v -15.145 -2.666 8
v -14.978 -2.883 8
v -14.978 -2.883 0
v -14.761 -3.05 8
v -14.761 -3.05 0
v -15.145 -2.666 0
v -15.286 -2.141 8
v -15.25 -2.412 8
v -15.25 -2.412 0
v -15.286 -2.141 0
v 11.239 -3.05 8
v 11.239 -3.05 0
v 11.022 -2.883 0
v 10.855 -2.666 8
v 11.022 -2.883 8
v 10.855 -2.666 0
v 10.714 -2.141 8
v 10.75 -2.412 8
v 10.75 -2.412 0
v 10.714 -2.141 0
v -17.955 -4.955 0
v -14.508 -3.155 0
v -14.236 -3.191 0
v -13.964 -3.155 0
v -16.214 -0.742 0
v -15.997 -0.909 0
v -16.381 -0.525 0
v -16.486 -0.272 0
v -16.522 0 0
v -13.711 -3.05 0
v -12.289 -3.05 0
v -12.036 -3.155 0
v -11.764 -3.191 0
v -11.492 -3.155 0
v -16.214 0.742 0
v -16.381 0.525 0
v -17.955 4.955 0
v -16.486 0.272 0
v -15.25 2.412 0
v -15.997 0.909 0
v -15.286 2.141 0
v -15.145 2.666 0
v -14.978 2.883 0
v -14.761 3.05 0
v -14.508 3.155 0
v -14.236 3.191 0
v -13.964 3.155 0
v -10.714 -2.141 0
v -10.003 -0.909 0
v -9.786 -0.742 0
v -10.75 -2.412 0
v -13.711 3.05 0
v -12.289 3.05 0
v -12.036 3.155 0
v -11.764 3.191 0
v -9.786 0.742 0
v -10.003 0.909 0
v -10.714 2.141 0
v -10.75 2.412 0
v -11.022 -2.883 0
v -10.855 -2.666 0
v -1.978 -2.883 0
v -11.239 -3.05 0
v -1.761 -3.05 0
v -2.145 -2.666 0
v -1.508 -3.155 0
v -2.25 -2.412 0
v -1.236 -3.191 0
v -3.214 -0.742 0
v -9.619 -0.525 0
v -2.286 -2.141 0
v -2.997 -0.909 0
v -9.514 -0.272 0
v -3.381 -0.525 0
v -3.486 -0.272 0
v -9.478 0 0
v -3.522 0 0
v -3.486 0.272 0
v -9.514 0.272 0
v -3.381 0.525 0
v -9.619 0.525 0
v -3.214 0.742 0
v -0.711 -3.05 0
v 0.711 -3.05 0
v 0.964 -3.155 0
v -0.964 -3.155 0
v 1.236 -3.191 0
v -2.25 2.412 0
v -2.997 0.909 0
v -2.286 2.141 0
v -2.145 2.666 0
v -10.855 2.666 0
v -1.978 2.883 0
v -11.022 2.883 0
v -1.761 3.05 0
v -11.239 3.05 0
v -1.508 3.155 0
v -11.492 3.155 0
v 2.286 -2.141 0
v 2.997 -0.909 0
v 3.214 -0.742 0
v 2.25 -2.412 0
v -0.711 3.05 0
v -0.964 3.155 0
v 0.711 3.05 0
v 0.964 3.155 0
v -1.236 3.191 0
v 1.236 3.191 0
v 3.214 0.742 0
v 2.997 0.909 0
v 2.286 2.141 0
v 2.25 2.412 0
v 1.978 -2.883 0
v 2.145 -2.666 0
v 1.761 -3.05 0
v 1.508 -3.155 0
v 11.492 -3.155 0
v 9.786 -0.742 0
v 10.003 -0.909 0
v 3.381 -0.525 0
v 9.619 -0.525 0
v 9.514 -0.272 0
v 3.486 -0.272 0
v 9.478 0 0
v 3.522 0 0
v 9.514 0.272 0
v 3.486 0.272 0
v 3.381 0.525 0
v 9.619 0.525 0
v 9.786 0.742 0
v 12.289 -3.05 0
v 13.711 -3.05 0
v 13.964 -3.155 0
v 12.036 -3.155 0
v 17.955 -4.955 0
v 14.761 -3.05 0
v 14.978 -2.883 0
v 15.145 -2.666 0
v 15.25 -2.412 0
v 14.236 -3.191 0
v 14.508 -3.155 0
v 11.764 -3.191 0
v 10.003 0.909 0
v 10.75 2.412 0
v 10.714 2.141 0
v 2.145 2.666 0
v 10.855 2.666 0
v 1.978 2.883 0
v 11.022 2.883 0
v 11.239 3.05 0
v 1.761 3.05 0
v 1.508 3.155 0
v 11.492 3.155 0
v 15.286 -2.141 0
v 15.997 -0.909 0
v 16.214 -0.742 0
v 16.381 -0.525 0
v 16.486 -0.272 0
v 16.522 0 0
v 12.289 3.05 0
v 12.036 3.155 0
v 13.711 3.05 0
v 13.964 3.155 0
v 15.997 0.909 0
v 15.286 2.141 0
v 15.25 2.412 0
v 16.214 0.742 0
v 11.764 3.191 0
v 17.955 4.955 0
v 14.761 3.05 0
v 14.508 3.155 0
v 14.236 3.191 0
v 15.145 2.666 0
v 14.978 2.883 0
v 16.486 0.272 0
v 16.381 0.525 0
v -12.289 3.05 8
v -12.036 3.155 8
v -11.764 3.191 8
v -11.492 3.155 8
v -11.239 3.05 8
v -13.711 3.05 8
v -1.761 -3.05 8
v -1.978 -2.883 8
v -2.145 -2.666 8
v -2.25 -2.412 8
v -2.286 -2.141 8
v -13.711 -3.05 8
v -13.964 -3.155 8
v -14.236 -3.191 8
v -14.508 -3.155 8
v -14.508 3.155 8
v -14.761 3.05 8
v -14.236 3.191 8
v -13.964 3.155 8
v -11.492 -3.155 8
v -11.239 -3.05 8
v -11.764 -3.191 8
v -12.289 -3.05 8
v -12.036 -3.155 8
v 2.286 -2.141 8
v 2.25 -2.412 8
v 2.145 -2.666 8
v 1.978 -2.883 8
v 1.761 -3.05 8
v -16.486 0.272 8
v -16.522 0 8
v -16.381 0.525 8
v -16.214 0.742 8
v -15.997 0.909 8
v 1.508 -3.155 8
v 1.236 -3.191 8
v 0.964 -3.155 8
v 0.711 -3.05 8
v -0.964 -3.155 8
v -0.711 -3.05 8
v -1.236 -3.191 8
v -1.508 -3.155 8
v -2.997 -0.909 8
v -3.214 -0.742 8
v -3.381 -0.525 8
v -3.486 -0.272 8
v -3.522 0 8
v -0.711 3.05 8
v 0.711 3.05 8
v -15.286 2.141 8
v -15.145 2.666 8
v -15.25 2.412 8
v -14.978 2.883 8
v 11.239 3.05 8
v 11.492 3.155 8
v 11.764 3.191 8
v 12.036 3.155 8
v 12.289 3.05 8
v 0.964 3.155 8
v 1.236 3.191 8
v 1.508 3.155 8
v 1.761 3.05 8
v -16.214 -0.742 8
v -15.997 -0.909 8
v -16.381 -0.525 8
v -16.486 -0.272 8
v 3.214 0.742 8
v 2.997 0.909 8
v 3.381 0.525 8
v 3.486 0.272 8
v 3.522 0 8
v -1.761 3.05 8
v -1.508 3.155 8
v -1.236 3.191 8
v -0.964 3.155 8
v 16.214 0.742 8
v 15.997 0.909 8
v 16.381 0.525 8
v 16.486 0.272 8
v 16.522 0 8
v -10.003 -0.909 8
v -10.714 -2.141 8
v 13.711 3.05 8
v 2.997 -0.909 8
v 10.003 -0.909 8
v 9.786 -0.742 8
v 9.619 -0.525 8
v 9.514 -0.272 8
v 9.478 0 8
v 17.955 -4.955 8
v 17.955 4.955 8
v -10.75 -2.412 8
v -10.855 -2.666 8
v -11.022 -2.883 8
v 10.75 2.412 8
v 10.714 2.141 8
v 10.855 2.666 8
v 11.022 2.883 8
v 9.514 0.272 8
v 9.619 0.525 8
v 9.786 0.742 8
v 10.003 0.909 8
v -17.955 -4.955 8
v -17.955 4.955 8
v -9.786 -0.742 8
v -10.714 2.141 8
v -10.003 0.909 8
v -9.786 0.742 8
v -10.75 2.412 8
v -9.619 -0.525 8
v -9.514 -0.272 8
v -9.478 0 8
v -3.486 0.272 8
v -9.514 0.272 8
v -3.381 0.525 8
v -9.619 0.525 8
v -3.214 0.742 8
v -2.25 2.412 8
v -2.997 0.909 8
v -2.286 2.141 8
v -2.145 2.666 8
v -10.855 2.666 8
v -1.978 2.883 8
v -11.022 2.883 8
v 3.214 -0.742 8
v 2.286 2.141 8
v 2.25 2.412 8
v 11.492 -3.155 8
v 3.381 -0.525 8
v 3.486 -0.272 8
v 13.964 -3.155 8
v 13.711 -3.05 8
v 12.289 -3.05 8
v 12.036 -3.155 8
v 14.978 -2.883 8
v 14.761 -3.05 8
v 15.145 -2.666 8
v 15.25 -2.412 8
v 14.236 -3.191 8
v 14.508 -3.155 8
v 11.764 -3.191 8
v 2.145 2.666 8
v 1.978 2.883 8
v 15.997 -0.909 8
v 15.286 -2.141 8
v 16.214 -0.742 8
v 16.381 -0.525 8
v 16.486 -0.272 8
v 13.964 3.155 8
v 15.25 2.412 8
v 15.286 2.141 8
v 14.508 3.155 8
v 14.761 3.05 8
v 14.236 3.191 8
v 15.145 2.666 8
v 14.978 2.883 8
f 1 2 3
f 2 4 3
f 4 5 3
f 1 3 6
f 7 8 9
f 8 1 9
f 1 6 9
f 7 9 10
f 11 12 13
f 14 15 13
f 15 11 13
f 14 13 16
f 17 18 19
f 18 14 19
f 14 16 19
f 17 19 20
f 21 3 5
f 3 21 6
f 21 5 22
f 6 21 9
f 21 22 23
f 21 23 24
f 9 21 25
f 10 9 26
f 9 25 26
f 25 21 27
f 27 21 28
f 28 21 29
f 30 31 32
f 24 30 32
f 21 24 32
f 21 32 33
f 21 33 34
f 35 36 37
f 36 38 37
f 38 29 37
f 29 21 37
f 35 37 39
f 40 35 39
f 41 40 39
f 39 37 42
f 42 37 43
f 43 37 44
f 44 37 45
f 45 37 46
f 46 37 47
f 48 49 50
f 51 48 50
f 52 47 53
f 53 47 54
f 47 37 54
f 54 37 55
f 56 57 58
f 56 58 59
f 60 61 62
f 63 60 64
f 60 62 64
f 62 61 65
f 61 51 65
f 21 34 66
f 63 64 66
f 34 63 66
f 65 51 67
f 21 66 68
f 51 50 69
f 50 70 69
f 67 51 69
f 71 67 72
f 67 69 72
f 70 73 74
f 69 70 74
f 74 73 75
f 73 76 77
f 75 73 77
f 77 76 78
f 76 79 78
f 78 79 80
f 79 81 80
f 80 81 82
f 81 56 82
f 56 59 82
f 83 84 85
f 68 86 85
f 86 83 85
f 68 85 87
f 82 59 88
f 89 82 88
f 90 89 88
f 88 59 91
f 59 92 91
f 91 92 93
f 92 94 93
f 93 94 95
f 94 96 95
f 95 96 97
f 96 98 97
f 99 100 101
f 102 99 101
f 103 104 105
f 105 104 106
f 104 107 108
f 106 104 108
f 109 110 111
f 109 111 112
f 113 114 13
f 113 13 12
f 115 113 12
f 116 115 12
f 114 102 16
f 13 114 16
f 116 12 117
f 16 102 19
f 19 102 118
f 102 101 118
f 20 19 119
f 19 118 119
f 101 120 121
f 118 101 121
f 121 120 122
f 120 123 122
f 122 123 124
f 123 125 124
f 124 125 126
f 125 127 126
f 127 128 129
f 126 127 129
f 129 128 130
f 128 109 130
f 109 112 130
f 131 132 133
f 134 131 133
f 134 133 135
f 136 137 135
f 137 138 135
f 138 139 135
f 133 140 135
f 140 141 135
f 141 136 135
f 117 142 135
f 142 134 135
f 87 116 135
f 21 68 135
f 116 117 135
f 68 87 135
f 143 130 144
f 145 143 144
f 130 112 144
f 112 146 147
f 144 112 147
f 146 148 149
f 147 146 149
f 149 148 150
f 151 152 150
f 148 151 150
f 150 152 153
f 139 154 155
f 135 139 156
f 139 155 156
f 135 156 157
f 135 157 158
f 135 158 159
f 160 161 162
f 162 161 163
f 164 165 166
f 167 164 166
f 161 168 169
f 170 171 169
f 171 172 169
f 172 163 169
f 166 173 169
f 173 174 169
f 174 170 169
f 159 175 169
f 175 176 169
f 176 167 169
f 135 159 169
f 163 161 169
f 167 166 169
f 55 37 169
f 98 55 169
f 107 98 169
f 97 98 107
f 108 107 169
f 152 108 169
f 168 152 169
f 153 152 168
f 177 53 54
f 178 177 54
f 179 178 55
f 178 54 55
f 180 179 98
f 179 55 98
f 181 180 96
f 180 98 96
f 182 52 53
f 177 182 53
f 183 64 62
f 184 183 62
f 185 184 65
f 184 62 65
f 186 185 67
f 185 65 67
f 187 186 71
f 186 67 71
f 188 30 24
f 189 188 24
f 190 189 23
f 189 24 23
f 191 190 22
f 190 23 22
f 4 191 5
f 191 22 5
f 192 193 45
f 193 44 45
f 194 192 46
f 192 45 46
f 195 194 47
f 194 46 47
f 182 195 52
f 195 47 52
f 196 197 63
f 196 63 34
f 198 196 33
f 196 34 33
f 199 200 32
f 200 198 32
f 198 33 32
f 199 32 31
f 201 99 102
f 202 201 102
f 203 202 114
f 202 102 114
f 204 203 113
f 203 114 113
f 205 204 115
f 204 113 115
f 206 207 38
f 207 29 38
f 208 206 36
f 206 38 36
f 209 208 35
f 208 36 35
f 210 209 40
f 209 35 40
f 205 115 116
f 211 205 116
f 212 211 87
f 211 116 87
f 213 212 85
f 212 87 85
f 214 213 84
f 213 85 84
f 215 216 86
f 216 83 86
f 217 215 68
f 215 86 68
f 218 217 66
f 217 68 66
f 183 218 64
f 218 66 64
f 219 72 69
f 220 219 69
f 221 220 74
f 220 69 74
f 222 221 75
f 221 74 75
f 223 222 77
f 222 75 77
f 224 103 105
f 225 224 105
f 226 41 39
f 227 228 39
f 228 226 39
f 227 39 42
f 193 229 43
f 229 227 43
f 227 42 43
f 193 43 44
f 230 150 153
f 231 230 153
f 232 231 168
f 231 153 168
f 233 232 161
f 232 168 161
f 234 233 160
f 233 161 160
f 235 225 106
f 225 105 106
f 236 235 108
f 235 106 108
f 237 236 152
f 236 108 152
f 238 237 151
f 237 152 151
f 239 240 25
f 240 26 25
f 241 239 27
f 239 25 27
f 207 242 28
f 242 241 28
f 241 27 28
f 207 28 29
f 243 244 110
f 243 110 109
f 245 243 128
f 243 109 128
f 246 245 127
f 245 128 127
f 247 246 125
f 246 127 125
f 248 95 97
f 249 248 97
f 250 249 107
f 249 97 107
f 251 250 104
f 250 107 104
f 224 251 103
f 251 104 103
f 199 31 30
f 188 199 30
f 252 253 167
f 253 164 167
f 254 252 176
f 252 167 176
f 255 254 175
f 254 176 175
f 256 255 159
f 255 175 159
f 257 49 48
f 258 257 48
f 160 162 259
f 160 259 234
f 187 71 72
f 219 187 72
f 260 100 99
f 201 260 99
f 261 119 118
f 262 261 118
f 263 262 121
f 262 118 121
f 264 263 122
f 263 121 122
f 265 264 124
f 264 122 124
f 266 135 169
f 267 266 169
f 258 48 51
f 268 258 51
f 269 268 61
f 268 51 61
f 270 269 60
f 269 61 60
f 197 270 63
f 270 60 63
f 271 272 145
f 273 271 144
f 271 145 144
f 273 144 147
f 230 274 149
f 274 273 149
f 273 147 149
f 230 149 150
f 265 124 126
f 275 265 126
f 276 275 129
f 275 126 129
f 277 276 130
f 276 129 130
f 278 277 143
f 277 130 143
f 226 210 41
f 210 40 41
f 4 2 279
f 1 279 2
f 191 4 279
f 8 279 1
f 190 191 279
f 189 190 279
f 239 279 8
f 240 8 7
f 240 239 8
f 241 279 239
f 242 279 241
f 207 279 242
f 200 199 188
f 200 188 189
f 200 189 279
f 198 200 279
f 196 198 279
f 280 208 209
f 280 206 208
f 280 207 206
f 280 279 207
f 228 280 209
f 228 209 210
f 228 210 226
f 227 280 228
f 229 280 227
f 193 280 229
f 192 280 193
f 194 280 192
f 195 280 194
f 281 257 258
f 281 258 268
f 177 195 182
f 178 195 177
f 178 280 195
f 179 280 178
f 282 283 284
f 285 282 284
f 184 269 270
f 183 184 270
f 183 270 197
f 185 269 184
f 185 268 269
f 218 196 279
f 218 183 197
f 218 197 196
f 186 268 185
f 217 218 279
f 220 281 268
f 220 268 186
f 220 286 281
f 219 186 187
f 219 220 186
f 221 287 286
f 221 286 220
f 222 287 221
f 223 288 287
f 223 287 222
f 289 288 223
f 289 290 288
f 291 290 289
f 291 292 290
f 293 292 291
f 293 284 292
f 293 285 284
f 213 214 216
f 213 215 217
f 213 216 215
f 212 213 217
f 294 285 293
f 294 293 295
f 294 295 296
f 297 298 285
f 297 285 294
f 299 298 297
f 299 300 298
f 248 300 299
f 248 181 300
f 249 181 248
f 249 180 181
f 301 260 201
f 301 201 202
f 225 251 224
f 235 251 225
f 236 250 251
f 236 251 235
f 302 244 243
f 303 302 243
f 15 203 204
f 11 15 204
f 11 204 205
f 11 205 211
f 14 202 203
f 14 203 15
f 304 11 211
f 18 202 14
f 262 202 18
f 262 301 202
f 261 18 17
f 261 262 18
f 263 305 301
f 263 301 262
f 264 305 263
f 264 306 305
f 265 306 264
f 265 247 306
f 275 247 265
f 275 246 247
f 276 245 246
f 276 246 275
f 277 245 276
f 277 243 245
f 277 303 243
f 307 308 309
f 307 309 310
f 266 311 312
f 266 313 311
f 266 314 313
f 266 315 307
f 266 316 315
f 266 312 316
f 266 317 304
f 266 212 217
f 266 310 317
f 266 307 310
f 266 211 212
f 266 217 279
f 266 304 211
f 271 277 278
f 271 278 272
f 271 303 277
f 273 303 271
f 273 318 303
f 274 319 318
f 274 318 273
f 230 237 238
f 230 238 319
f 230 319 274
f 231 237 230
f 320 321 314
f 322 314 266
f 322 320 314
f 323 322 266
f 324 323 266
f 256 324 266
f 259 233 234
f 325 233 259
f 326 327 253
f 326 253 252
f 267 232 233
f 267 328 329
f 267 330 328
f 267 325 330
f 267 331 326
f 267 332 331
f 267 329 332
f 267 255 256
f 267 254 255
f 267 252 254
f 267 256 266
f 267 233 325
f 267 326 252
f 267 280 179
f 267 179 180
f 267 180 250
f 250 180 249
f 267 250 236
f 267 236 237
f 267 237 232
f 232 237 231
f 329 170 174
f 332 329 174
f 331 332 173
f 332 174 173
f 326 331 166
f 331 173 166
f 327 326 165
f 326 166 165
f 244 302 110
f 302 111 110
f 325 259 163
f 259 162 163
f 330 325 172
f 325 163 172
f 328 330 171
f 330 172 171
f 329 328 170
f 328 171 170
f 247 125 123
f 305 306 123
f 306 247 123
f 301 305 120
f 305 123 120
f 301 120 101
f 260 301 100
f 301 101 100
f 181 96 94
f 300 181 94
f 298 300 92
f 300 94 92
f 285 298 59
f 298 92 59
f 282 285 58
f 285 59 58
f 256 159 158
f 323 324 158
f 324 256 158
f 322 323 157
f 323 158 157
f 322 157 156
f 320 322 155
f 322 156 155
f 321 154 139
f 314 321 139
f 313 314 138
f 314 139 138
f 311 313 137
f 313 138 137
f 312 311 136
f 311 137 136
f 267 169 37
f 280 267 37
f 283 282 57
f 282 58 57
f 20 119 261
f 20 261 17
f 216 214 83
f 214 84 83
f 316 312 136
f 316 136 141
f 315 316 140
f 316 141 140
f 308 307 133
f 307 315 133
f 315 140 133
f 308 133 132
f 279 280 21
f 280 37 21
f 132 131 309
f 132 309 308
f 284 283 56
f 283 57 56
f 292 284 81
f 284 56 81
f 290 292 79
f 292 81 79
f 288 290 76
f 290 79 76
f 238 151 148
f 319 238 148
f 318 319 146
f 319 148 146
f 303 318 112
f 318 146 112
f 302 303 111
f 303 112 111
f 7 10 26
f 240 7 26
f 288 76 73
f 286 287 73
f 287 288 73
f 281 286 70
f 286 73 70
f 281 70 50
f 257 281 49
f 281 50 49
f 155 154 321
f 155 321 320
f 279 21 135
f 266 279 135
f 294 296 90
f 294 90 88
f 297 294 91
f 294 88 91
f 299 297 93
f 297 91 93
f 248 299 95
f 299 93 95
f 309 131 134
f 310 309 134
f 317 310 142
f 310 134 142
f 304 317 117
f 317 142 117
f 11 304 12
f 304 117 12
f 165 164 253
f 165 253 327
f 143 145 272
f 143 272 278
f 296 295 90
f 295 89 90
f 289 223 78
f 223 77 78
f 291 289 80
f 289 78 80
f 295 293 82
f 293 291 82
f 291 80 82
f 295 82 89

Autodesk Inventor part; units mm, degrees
ref_plane "YZ Plane" through (0, 0, 0) normal (1, 0, 0) x (0, 1, 0)
ref_plane "XZ Plane" through (0, 0, 0) normal (0, 1, 0) x (-1, 0, 0)
ref_plane "XY Plane" through (0, 0, 0) normal (0, 0, 1) x (1, 0, 0)
sketch "スケッチ1" plane through (0, 0, 0) normal (0, 0, 1) x (1, 0, 0)
  line L0 (-17.955, -4.955) -> (17.955, -4.955)
  line L1 (17.955, -4.955) -> (17.955, 4.955)
  line L2 (17.955, 4.955) -> (-17.955, 4.955)
  line L3 (-17.955, 4.955) -> (-17.955, -4.955)
  line L4 (-17.955, -4.955) -> (17.955, 4.955) construction
  line L5 (17.955, -4.955) -> (-17.955, 4.955) construction
  circle A0 centre (-13, 0) radius 1.55
  circle A1 centre (0, 0) radius 1.55
  line L6 (0, 0) -> (0, 4.955) construction
  line L7 (-12.5995, 4.955) -> (4.4005, 4.955) construction
  line L8 (-8.5, -4) -> (8.5, -4) construction
  line L9 (-11.2391, -3.05) -> (-14.7609, -3.05)
  line L10 (-14.7609, -3.05) -> (-16.5218, 0)
  line L11 (-16.5218, 0) -> (-14.7609, 3.05)
  line L12 (-14.7609, 3.05) -> (-11.2391, 3.05)
  line L13 (-11.2391, 3.05) -> (-9.4782, 0)
  line L14 (-9.4782, 0) -> (-11.2391, -3.05)
  circle A2 centre (-15.4718, 0) radius 1.05
  circle A3 centre (-14.2359, -2.1407) radius 1.05
  circle A4 centre (-11.7641, -2.1407) radius 1.05
  circle A5 centre (-10.5282, 0) radius 1.05
  circle A6 centre (-11.7641, 2.1407) radius 1.05
  circle A7 centre (-14.2359, 2.1407) radius 1.05
  circle A8 centre (13, 0) radius 1.55
  line L15 (11.2391, -3.05) -> (14.7609, -3.05)
  line L16 (14.7609, -3.05) -> (16.5218, 0)
  line L17 (16.5218, 0) -> (14.7609, 3.05)
  line L18 (14.7609, 3.05) -> (11.2391, 3.05)
  line L19 (11.2391, 3.05) -> (9.4782, 0)
  line L20 (9.4782, 0) -> (11.2391, -3.05)
  circle A9 centre (15.4718, 0) radius 1.05
  circle A10 centre (14.2359, -2.1407) radius 1.05
  circle A11 centre (11.7641, -2.1407) radius 1.05
  circle A12 centre (10.5282, 0) radius 1.05
  circle A13 centre (11.7641, 2.1407) radius 1.05
  circle A14 centre (14.2359, 2.1407) radius 1.05
  circle A15 centre (-13, 0) radius 4.955 construction
  line L21 (1.7609, -3.05) -> (-1.7609, -3.05)
  line L22 (-1.7609, -3.05) -> (-3.5218, 0)
  line L23 (-3.5218, 0) -> (-1.7609, 3.05)
  line L24 (-1.7609, 3.05) -> (1.7609, 3.05)
  line L25 (1.7609, 3.05) -> (3.5218, 0)
  line L26 (3.5218, 0) -> (1.7609, -3.05)
  circle A16 centre (-2.4718, 0) radius 1.05
  circle A17 centre (-1.2359, -2.1407) radius 1.05
  circle A18 centre (1.2359, -2.1407) radius 1.05
  circle A19 centre (2.4718, 0) radius 1.05
  circle A20 centre (1.2359, 2.1407) radius 1.05
  circle A21 centre (-1.2359, 2.1407) radius 1.05
  point P0 (-11.2391, -3.05)
  point P1 (-9.4782, 0)
  point P2 (-11.2391, 3.05)
  point P3 (-14.7609, 3.05)
  point P4 (11.2391, -3.05)
  point P5 (9.4782, 0)
  point P6 (11.2391, 3.05)
  point P7 (14.7609, 3.05)
  point P8 (-1.7609, -3.05)
  point P9 (1.7609, -3.05)
  point P10 (3.5218, 0)
  point P11 (1.7609, 3.05)
  point P12 (-1.7609, 3.05)
  dimension "d19" = 2.1
  dimension "d1" = 3.1
  dimension "d4" = 13
  dimension "d5" = 9.91
  dimension "d20" = 6.1
  dimension "d23" = 360
  dimension "d33" = 360
extrude "押し出し1" add sketch "スケッチ1" along normal blind 8
equation "\"d4\" = d0"
equation "\"d0\" = 13"
properties part number "胴体_サブフレーム_1_2" material "アセタール樹脂、黒"
